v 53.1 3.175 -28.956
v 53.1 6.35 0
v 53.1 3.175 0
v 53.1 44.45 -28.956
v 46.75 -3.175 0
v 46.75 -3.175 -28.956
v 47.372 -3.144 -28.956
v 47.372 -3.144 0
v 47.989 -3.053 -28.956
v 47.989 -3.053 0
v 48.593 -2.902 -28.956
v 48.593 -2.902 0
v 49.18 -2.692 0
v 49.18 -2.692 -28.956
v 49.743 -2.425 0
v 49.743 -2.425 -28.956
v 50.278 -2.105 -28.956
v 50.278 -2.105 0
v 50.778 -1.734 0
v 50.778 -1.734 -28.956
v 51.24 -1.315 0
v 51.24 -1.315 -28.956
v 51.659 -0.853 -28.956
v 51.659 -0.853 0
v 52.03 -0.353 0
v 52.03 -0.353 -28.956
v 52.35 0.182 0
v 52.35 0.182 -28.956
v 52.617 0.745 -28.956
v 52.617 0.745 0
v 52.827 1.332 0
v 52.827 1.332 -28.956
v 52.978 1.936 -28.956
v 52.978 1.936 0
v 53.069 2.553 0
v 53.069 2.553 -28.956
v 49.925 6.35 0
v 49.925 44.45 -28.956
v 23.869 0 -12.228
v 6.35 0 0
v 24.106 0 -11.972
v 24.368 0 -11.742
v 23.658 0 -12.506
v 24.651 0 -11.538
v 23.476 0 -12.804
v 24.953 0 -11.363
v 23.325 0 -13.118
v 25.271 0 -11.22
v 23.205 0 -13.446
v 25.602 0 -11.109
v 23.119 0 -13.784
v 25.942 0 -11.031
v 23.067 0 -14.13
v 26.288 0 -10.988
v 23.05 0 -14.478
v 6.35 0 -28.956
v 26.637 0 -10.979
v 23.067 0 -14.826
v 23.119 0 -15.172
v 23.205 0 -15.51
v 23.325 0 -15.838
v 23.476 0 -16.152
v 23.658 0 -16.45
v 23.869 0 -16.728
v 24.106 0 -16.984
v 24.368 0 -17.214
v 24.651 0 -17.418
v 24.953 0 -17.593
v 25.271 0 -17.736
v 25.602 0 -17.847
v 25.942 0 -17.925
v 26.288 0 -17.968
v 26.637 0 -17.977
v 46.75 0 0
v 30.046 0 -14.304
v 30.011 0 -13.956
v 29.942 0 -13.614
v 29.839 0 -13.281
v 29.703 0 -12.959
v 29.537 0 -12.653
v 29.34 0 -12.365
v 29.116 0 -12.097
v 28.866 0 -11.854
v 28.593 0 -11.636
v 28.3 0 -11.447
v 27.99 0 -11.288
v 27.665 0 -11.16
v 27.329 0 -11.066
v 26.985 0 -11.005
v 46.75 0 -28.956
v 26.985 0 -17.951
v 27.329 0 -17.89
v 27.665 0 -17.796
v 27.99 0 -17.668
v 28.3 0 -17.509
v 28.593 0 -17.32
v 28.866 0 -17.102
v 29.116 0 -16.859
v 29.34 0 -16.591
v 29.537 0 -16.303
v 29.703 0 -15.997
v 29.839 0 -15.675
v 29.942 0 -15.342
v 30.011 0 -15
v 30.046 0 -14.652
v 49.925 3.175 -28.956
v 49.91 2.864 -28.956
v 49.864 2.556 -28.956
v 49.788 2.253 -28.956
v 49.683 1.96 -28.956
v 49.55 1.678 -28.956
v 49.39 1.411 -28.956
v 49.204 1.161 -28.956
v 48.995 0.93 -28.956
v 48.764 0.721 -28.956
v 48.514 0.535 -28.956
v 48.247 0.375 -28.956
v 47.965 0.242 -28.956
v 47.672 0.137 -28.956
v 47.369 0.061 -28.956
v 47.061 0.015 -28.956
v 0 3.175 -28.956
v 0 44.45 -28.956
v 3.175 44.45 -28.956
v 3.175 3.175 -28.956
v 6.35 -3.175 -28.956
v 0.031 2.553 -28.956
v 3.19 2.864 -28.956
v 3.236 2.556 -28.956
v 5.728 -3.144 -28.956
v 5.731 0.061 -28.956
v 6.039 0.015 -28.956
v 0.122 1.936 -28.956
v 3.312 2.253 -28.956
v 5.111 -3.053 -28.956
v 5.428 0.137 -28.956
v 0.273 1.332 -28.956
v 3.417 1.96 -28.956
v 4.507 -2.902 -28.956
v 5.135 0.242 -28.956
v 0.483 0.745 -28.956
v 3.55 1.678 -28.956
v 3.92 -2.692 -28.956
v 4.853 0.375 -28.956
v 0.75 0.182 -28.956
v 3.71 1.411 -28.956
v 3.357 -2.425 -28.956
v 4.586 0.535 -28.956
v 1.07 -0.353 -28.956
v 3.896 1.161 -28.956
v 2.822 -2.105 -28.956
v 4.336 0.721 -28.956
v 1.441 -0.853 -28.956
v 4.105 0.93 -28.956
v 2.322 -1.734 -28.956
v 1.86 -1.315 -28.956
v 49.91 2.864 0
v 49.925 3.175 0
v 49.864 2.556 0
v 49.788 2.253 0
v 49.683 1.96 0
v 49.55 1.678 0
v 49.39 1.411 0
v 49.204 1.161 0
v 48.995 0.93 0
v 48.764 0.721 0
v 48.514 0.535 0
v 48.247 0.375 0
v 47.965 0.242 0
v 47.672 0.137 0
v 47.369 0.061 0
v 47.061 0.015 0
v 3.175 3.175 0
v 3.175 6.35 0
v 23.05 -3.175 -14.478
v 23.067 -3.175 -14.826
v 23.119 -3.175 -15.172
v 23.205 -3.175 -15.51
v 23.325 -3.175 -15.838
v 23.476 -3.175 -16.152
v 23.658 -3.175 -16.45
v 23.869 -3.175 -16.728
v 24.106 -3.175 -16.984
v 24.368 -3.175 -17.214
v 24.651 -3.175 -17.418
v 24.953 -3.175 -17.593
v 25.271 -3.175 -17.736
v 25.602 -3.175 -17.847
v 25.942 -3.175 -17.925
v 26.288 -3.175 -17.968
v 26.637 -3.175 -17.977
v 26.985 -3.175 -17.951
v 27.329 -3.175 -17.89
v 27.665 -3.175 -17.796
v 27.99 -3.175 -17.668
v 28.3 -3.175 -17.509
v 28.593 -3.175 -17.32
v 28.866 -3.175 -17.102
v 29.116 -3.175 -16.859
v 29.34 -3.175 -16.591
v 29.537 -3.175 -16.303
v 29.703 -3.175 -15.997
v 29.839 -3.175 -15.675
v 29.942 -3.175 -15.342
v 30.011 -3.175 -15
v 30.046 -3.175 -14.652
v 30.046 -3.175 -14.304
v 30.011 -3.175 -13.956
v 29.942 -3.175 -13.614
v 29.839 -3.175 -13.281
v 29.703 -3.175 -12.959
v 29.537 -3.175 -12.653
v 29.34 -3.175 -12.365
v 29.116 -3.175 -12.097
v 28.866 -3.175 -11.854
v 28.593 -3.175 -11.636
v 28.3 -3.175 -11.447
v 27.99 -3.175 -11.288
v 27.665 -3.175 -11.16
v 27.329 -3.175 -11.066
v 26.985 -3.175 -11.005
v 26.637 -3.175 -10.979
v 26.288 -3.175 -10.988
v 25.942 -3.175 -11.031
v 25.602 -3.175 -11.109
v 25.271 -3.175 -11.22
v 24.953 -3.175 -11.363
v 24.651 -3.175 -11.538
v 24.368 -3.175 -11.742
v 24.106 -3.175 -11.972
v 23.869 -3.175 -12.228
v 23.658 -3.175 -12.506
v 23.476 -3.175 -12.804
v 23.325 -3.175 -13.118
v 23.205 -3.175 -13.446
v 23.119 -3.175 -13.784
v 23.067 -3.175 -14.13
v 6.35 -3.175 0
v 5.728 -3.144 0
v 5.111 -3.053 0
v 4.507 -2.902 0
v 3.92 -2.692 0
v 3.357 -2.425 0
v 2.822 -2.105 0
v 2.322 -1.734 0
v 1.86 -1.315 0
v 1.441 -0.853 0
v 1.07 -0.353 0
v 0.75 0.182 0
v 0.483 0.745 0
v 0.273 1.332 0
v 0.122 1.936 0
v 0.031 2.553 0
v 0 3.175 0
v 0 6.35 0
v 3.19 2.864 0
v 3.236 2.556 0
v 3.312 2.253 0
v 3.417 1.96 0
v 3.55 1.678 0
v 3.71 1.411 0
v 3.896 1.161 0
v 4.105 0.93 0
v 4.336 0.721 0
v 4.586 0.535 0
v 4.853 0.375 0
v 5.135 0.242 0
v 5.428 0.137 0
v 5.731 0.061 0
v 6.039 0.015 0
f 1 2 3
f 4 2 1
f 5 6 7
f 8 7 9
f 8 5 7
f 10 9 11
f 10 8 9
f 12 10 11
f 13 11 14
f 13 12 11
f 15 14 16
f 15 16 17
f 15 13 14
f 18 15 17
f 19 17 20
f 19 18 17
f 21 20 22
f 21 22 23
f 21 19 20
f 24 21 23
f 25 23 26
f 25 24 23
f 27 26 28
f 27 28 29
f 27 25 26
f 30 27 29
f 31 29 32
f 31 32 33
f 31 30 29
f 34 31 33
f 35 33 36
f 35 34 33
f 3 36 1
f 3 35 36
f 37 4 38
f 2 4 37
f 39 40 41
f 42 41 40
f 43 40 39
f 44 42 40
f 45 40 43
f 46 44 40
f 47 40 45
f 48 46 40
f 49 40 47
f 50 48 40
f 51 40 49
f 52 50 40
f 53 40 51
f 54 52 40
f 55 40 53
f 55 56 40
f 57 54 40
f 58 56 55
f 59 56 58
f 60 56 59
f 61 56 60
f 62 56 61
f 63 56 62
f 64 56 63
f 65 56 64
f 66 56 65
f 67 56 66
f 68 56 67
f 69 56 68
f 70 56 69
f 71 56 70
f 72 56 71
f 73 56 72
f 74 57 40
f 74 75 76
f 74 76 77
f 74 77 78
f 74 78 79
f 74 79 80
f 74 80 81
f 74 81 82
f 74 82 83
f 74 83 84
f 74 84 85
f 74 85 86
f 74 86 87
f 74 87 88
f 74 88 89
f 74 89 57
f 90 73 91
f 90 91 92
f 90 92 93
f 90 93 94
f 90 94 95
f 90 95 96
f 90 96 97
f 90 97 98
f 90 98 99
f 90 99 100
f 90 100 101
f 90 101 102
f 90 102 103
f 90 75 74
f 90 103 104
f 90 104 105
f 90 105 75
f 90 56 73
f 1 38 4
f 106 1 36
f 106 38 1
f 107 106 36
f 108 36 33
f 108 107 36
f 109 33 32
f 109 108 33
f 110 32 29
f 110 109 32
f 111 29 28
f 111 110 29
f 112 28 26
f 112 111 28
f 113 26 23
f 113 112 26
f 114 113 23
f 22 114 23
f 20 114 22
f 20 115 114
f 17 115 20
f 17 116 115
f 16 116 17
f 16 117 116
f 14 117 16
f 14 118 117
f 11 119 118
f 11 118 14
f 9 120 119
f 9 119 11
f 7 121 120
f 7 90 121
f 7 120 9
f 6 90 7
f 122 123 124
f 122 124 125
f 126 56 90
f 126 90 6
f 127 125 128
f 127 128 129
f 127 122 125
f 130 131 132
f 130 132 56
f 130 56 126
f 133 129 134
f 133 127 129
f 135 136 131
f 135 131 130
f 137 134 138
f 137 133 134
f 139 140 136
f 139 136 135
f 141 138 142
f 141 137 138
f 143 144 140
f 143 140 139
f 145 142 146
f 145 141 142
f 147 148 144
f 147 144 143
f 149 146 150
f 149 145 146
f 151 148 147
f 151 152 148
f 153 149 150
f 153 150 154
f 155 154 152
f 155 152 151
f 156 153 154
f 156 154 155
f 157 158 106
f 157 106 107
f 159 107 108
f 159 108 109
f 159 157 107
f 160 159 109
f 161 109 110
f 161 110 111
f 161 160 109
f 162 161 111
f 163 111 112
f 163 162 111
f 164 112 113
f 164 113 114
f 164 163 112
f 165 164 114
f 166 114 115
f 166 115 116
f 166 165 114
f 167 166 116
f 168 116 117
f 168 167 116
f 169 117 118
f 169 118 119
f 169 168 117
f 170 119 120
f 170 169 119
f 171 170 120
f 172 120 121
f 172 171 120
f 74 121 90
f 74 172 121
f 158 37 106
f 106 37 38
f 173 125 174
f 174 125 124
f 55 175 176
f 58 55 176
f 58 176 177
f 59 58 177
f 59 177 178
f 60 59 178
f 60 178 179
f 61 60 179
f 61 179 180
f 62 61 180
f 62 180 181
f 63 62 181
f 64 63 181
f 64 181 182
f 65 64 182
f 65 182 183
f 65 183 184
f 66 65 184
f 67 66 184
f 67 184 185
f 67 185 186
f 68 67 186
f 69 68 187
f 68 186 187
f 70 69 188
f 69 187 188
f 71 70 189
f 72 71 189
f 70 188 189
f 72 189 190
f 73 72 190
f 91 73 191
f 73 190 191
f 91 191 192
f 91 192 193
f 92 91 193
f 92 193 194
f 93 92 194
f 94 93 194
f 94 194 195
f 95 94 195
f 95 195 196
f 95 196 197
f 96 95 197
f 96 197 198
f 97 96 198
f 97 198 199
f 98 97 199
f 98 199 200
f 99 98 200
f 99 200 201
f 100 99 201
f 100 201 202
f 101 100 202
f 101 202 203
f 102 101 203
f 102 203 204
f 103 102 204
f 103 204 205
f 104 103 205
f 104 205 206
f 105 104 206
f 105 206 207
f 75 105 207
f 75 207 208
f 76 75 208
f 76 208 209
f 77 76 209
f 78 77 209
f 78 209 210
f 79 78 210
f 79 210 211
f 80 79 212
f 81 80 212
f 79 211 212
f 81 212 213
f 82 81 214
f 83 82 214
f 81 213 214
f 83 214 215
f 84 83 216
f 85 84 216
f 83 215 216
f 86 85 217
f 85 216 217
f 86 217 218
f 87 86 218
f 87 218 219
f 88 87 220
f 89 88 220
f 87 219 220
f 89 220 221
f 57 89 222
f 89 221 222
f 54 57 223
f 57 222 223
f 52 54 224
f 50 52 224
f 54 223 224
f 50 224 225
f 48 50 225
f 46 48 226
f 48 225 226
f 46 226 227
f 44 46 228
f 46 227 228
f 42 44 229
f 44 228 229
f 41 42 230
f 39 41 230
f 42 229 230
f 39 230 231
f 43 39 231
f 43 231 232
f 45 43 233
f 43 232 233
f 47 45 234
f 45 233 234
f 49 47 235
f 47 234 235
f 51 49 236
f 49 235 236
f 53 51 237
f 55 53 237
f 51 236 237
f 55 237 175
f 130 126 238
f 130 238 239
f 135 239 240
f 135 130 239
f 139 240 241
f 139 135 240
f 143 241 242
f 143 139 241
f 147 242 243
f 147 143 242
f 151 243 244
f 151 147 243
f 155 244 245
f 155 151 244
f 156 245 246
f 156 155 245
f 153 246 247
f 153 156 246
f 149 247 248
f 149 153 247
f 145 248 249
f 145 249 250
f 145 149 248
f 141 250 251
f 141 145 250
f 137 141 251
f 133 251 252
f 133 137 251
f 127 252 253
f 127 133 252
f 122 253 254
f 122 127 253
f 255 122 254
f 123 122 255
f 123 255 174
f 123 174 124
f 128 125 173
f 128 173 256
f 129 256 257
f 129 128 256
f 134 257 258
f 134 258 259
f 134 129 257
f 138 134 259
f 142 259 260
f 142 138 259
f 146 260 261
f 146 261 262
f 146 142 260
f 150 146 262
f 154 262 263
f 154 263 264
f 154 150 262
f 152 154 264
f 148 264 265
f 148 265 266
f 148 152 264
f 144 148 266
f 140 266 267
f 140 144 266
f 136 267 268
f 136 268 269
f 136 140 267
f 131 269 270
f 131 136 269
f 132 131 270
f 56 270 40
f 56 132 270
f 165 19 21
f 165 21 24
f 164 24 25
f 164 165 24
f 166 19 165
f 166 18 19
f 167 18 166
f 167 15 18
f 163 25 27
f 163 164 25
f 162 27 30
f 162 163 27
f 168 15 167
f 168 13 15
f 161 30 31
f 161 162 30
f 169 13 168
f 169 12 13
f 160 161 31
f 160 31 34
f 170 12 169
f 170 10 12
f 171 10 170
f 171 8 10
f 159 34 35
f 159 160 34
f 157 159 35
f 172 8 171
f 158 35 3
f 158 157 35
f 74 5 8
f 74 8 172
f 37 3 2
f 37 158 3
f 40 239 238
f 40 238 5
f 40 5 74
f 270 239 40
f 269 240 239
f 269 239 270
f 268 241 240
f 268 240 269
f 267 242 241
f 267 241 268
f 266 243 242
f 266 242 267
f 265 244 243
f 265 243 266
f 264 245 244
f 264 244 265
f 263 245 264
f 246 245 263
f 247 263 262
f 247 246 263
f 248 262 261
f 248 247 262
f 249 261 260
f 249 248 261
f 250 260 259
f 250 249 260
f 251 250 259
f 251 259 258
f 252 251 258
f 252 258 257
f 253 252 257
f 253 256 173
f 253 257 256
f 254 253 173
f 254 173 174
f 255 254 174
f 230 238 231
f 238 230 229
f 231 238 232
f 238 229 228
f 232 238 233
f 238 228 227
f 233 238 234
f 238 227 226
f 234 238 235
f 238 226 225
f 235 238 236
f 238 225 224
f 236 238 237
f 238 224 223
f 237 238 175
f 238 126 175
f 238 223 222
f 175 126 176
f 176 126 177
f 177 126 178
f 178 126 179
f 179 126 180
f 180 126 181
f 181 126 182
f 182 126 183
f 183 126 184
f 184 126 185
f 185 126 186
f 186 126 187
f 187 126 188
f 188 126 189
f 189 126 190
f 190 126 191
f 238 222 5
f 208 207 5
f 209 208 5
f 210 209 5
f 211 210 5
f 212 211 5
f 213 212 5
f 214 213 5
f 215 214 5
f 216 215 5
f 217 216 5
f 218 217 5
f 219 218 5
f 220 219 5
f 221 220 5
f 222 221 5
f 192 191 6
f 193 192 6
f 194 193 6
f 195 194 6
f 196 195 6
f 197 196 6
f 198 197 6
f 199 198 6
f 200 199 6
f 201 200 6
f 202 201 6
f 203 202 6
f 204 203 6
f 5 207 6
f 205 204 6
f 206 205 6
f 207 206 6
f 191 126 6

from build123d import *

# Parameters (mm, degrees)
SKETCH3_W                      = 53.099999972
SKETCH3_H                      = 28.956
BASE_FLANGE1_DEPTH             = 3.175
EDGE_FLANGE4_STRIP_W           = 19.05
EDGE_FLANGE4_STRIP_H           = 3.175
EDGE_FLANGE4_STRIP_CUT_DEPTH   = 28.956
EDGE_FLANGE4_STRIP_2_W         = 19.05
EDGE_FLANGE4_STRIP_2_H         = 3.175
EDGE_FLANGE4_STRIP_CUT_2_DEPTH = 28.956
EDGE_FLANGE4_DEPTH             = 28.956
EDGE_FLANGE4_FLAT_DEPTH        = 3.175
EDGE_FLANGE4_BEND_DEPTH        = 28.956
EDGE_FLANGE4_FLAT_2_DEPTH      = 3.175
M6_CLEARANCE_HOLE1_D           = 7


# Sheet-metal steps are written as plain solids
with BuildPart() as part:
    # Sketch3 → Base-Flange1 (new body)
    with BuildSketch(Plane(origin=(0, 0, 0), x_dir=(1, 0, 0), z_dir=(0, 1, 0))):
        with Locations((26.549999986, 14.478)):
            Rectangle(SKETCH3_W, SKETCH3_H)
    extrude(amount=-BASE_FLANGE1_DEPTH)

    # Edge-Flange4 strip (across the edge) → Edge-Flange4 strip cut (cut)
    with BuildSketch(Plane(origin=(53.099999972, 0, 0), x_dir=(-1, 0, 0), z_dir=(0, 0, -1))):
        with Locations((-3.175, -1.5875)):
            Rectangle(EDGE_FLANGE4_STRIP_W, EDGE_FLANGE4_STRIP_H)
    extrude(amount=EDGE_FLANGE4_STRIP_CUT_DEPTH, mode=Mode.SUBTRACT)

    # Edge-Flange4 strip 2 (across the edge) → Edge-Flange4 strip cut 2 (cut)
    with BuildSketch(Plane.XY.offset(-28.956)):
        with Locations((-3.175, -1.5875)):
            Rectangle(EDGE_FLANGE4_STRIP_2_W, EDGE_FLANGE4_STRIP_2_H)
    extrude(amount=EDGE_FLANGE4_STRIP_CUT_2_DEPTH, mode=Mode.SUBTRACT)

    # Edge-Flange4 bend section (across the edge) → Edge-Flange4 (add)
    with BuildSketch(Plane(origin=(53.099999972, 0, 0), x_dir=(-1, 0, 0), z_dir=(0, 0, -1))):
        with BuildLine():
            Line((0, 3.175), (3.175, 3.175))
            ThreePointArc((3.175, 3.175), (4.10493597, 0.92993597), (6.35, 0))
            Line((6.35, 0), (6.35, -3.175))
            ThreePointArc((6.35, -3.175), (1.859871939, -1.315128061), (0, 3.175))
        make_face()
    extrude(amount=EDGE_FLANGE4_DEPTH)

    # Edge-Flange4 profile (on flange) → Edge-Flange4 flat (add)
    with BuildSketch(Plane(origin=(53.099999972, 0, 0), x_dir=(0, 0, -1), z_dir=(1, 0, 0))):
        Polygon((0, 6.35), (0, 3.175), (28.956, 3.175), (28.956, 44.45), align=None)
    extrude(amount=-EDGE_FLANGE4_FLAT_DEPTH)

    # Edge-Flange4 bend section 2 (across the edge) → Edge-Flange4 bend (add)
    with BuildSketch(Plane.XY.offset(-28.956)):
        with BuildLine():
            Line((0, 3.175), (3.175, 3.175))
            ThreePointArc((3.175, 3.175), (4.10493597, 0.92993597), (6.35, 0))
            Line((6.35, 0), (6.35, -3.175))
            ThreePointArc((6.35, -3.175), (1.859871939, -1.315128061), (0, 3.175))
        make_face()
    extrude(amount=EDGE_FLANGE4_BEND_DEPTH)

    # Edge-Flange4 profile 2 (on flange) → Edge-Flange4 flat 2 (add)
    with BuildSketch(Plane.ZY):
        Polygon((-28.956, 44.45), (-28.956, 3.175), (0, 3.175), (0, 6.35), align=None)
    extrude(amount=-EDGE_FLANGE4_FLAT_2_DEPTH)

    # M6 Clearance Hole1 (through all)
    with Locations(Plane(origin=(0, 0, 0), x_dir=(1, 0, 0), z_dir=(0, 1, 0))):
        with Locations((26.549999986, 14.478)):
            Hole(M6_CLEARANCE_HOLE1_D / 2)


solid = part.part
